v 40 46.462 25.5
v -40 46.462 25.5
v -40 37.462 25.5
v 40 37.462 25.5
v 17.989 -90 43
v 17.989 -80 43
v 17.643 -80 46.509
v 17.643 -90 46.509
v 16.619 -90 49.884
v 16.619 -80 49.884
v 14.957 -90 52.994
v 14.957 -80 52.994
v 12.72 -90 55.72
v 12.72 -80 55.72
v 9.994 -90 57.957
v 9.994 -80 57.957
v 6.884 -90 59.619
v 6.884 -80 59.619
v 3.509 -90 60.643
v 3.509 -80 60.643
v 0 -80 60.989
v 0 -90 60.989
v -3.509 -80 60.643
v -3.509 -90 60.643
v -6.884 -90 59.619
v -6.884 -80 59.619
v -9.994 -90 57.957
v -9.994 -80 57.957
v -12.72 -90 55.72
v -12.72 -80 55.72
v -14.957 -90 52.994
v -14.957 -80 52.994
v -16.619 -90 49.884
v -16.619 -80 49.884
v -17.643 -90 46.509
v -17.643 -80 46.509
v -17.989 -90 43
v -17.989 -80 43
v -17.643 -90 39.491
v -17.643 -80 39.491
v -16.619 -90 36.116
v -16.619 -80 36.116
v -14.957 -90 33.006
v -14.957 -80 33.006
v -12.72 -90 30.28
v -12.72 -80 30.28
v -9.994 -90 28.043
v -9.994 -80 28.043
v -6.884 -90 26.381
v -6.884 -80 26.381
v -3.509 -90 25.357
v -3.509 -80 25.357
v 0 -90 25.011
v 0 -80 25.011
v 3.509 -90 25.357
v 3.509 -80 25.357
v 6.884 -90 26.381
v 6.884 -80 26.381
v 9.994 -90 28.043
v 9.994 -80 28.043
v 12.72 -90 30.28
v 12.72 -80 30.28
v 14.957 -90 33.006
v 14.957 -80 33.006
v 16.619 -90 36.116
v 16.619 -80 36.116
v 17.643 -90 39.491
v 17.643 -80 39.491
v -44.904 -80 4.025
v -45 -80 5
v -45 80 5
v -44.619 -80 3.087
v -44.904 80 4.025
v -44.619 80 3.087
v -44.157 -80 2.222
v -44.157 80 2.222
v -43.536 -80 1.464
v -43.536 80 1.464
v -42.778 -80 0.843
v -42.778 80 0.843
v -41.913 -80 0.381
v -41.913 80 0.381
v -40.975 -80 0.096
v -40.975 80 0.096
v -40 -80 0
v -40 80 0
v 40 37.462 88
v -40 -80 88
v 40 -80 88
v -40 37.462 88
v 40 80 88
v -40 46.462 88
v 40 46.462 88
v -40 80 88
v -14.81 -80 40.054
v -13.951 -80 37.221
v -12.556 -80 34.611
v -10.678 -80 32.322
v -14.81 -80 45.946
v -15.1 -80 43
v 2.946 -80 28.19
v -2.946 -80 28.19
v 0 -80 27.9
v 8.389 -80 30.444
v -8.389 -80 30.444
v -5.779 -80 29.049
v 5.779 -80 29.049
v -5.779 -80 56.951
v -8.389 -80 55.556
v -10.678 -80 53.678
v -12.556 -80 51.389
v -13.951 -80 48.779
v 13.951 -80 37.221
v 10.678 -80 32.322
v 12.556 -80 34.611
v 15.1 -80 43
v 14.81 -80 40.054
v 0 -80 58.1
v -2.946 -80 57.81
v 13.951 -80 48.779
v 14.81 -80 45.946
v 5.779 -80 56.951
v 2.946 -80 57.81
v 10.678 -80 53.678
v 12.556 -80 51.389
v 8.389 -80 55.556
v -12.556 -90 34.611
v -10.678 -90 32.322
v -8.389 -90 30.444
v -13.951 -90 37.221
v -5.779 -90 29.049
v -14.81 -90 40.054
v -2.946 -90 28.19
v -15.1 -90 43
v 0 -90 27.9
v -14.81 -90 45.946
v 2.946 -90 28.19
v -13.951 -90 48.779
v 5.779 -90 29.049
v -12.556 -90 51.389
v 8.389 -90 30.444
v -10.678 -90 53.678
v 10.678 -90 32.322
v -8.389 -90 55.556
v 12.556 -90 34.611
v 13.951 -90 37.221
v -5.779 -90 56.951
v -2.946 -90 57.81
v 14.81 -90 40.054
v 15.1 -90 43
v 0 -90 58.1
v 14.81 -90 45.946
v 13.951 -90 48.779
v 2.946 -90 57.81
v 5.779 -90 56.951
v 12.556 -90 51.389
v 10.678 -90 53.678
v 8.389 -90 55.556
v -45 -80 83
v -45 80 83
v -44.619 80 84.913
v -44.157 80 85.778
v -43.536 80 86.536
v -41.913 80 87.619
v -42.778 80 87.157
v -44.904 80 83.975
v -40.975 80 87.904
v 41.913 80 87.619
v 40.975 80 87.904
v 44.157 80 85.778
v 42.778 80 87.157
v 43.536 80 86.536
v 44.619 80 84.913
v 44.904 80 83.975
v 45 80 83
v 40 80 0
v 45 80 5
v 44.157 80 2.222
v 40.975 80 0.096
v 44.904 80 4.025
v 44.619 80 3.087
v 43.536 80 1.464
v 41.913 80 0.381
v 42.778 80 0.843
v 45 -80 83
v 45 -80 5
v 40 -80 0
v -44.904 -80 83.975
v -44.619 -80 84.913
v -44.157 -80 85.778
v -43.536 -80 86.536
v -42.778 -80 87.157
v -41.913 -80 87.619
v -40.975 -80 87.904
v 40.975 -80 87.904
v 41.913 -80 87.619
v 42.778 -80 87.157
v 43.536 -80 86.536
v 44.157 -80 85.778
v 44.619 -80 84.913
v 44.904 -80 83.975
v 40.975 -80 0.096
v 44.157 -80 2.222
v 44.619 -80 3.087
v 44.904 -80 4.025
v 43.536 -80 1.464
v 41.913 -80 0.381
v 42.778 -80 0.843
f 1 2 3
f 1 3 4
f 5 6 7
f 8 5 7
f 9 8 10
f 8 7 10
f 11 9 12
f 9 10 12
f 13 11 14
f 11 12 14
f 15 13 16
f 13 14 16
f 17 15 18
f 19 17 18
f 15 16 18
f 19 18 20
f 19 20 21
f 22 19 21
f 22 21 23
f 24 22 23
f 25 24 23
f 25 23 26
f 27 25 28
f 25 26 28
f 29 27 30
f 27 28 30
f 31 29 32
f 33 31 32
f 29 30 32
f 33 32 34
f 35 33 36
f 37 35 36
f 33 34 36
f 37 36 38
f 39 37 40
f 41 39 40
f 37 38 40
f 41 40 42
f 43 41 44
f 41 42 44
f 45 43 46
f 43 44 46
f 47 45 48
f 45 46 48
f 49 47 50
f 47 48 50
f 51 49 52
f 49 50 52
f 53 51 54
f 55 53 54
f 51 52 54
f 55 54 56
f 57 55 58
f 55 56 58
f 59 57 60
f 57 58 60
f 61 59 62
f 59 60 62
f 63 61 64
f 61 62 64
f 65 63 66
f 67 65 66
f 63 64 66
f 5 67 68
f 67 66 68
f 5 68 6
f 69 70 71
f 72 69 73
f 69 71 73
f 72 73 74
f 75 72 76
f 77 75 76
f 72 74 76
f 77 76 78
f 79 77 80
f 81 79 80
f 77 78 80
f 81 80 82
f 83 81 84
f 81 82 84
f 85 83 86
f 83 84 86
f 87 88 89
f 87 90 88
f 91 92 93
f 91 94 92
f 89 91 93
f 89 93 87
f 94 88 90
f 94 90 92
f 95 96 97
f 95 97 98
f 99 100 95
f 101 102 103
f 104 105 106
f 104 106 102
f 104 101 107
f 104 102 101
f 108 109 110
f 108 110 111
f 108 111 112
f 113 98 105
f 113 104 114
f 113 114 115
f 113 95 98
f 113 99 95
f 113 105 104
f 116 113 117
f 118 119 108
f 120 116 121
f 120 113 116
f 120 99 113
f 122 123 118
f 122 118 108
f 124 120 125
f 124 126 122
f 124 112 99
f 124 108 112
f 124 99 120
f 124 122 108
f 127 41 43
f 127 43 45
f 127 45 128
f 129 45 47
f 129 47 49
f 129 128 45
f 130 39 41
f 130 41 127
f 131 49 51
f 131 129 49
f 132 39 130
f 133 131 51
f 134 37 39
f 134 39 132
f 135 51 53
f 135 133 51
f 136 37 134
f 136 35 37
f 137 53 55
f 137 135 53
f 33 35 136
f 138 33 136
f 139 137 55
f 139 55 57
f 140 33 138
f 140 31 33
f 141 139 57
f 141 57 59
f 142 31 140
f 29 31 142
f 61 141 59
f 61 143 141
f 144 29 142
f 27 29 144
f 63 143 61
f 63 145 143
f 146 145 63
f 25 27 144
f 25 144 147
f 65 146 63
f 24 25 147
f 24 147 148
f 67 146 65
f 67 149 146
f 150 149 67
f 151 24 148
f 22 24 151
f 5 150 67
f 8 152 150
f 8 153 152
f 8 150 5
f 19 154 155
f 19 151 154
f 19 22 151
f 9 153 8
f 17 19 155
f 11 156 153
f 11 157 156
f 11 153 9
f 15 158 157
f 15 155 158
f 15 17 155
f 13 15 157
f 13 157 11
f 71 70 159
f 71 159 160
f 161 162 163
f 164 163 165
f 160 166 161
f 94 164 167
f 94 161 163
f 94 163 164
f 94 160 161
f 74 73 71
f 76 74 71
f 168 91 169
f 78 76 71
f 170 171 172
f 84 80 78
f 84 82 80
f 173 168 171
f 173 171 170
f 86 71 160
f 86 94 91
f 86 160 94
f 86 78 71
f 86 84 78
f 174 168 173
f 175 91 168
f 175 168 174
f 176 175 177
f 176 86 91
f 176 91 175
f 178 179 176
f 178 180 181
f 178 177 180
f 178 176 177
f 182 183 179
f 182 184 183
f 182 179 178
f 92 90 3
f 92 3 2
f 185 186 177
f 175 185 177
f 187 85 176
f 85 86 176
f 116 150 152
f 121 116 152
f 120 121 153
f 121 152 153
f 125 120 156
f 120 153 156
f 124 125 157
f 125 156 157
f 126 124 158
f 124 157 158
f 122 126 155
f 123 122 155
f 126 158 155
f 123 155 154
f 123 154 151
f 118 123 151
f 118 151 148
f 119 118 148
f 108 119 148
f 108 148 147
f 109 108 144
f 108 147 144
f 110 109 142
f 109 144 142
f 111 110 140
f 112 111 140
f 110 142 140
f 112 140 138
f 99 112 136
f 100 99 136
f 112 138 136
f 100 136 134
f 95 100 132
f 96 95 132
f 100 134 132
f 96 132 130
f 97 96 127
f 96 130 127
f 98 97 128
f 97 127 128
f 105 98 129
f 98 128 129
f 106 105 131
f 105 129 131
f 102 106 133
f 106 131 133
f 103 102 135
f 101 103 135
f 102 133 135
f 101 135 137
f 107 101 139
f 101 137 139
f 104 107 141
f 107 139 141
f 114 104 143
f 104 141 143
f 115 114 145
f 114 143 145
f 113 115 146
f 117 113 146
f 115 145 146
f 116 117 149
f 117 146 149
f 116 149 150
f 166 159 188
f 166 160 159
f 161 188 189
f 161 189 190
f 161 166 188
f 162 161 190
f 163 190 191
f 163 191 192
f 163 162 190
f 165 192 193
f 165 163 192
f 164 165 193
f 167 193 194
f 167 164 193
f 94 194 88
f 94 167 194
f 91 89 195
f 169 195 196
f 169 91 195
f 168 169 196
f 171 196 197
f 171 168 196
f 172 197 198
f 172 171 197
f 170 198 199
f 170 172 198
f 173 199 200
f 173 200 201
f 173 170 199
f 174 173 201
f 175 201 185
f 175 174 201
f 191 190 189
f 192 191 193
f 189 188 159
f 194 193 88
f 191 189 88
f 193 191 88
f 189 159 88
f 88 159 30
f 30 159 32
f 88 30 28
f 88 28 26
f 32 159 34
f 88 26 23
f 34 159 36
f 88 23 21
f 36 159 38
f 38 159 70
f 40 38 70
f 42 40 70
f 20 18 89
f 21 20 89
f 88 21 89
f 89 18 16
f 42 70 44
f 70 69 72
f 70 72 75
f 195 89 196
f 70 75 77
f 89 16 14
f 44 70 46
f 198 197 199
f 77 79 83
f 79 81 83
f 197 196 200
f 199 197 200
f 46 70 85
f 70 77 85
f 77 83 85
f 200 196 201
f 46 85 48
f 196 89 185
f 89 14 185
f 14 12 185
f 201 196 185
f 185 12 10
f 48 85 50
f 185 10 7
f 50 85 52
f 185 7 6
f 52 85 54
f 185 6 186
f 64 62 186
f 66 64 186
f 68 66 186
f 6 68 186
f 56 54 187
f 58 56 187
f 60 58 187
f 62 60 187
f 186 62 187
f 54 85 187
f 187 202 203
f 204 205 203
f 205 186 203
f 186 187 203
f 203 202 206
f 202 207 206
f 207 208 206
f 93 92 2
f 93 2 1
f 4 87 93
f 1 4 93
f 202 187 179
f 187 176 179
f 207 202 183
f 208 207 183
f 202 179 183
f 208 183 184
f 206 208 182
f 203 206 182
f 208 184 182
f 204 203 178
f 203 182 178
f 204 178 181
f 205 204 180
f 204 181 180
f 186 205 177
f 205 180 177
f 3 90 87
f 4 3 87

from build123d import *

# Parameters (mm, degrees)
F0_W     = 90
F0_H     = 160
F1_DEPTH = 88
F2_W     = 80
F2_H     = 9
F3_DEPTH = 12.5
F4_DEPTH = 50
F5_R     = 17.988747928
F6_DEPTH = 10
F7_R     = 15.1004844519
F8_DEPTH = 10
F9_R     = 4.99999


# Not quite as in the source:
# - a fillet or chamfer is up to 0.001 mm smaller than in the source, because OpenCascade refuses the exact size


with BuildPart() as f1:
    # F0 (on Top) → F1 (new body)
    with BuildSketch(Plane.XY):
        Rectangle(F0_W, F0_H)
    extrude(amount=F1_DEPTH)

    # F2 (on face) → F3 (cut, symmetric)
    with BuildSketch(Plane.XY.offset(88)):
        with Locations((0, 41.9618518679)):
            Rectangle(F2_W, F2_H)
    extrude(amount=F3_DEPTH, both=True, mode=Mode.SUBTRACT)

    # F4 (cut): a face of the model
    f4_faces = [f1.faces().sort_by_distance(p)[0] for p in [
        (0, 41.9618518679, 75.5),
    ]]
    extrude(f4_faces, amount=-F4_DEPTH, mode=Mode.SUBTRACT)

    # F5 (on face) → F6 (join)
    with BuildSketch(Plane.XZ.offset(80)):
        with Locations((0, 43)):
            Circle(F5_R)
    extrude(amount=F6_DEPTH)

    # F7 (on face) → F8 (cut)
    with BuildSketch(Plane.XZ.offset(90)):
        with Locations((0, 43)):
            Circle(F7_R)
    extrude(amount=-F8_DEPTH, mode=Mode.SUBTRACT)

    # F9 (radius 5 in the source; OpenCascade refuses exactly that, so slightly less here)
    f9_edges = [f1.edges().sort_by_distance(p)[0] for p in [
        (-45, 0, 88),
        (45, 0, 88),
        (45, 0, 0),
        (-45, 0, 0),
    ]]
    fillet(f9_edges, radius=F9_R)


solid = f1.part
